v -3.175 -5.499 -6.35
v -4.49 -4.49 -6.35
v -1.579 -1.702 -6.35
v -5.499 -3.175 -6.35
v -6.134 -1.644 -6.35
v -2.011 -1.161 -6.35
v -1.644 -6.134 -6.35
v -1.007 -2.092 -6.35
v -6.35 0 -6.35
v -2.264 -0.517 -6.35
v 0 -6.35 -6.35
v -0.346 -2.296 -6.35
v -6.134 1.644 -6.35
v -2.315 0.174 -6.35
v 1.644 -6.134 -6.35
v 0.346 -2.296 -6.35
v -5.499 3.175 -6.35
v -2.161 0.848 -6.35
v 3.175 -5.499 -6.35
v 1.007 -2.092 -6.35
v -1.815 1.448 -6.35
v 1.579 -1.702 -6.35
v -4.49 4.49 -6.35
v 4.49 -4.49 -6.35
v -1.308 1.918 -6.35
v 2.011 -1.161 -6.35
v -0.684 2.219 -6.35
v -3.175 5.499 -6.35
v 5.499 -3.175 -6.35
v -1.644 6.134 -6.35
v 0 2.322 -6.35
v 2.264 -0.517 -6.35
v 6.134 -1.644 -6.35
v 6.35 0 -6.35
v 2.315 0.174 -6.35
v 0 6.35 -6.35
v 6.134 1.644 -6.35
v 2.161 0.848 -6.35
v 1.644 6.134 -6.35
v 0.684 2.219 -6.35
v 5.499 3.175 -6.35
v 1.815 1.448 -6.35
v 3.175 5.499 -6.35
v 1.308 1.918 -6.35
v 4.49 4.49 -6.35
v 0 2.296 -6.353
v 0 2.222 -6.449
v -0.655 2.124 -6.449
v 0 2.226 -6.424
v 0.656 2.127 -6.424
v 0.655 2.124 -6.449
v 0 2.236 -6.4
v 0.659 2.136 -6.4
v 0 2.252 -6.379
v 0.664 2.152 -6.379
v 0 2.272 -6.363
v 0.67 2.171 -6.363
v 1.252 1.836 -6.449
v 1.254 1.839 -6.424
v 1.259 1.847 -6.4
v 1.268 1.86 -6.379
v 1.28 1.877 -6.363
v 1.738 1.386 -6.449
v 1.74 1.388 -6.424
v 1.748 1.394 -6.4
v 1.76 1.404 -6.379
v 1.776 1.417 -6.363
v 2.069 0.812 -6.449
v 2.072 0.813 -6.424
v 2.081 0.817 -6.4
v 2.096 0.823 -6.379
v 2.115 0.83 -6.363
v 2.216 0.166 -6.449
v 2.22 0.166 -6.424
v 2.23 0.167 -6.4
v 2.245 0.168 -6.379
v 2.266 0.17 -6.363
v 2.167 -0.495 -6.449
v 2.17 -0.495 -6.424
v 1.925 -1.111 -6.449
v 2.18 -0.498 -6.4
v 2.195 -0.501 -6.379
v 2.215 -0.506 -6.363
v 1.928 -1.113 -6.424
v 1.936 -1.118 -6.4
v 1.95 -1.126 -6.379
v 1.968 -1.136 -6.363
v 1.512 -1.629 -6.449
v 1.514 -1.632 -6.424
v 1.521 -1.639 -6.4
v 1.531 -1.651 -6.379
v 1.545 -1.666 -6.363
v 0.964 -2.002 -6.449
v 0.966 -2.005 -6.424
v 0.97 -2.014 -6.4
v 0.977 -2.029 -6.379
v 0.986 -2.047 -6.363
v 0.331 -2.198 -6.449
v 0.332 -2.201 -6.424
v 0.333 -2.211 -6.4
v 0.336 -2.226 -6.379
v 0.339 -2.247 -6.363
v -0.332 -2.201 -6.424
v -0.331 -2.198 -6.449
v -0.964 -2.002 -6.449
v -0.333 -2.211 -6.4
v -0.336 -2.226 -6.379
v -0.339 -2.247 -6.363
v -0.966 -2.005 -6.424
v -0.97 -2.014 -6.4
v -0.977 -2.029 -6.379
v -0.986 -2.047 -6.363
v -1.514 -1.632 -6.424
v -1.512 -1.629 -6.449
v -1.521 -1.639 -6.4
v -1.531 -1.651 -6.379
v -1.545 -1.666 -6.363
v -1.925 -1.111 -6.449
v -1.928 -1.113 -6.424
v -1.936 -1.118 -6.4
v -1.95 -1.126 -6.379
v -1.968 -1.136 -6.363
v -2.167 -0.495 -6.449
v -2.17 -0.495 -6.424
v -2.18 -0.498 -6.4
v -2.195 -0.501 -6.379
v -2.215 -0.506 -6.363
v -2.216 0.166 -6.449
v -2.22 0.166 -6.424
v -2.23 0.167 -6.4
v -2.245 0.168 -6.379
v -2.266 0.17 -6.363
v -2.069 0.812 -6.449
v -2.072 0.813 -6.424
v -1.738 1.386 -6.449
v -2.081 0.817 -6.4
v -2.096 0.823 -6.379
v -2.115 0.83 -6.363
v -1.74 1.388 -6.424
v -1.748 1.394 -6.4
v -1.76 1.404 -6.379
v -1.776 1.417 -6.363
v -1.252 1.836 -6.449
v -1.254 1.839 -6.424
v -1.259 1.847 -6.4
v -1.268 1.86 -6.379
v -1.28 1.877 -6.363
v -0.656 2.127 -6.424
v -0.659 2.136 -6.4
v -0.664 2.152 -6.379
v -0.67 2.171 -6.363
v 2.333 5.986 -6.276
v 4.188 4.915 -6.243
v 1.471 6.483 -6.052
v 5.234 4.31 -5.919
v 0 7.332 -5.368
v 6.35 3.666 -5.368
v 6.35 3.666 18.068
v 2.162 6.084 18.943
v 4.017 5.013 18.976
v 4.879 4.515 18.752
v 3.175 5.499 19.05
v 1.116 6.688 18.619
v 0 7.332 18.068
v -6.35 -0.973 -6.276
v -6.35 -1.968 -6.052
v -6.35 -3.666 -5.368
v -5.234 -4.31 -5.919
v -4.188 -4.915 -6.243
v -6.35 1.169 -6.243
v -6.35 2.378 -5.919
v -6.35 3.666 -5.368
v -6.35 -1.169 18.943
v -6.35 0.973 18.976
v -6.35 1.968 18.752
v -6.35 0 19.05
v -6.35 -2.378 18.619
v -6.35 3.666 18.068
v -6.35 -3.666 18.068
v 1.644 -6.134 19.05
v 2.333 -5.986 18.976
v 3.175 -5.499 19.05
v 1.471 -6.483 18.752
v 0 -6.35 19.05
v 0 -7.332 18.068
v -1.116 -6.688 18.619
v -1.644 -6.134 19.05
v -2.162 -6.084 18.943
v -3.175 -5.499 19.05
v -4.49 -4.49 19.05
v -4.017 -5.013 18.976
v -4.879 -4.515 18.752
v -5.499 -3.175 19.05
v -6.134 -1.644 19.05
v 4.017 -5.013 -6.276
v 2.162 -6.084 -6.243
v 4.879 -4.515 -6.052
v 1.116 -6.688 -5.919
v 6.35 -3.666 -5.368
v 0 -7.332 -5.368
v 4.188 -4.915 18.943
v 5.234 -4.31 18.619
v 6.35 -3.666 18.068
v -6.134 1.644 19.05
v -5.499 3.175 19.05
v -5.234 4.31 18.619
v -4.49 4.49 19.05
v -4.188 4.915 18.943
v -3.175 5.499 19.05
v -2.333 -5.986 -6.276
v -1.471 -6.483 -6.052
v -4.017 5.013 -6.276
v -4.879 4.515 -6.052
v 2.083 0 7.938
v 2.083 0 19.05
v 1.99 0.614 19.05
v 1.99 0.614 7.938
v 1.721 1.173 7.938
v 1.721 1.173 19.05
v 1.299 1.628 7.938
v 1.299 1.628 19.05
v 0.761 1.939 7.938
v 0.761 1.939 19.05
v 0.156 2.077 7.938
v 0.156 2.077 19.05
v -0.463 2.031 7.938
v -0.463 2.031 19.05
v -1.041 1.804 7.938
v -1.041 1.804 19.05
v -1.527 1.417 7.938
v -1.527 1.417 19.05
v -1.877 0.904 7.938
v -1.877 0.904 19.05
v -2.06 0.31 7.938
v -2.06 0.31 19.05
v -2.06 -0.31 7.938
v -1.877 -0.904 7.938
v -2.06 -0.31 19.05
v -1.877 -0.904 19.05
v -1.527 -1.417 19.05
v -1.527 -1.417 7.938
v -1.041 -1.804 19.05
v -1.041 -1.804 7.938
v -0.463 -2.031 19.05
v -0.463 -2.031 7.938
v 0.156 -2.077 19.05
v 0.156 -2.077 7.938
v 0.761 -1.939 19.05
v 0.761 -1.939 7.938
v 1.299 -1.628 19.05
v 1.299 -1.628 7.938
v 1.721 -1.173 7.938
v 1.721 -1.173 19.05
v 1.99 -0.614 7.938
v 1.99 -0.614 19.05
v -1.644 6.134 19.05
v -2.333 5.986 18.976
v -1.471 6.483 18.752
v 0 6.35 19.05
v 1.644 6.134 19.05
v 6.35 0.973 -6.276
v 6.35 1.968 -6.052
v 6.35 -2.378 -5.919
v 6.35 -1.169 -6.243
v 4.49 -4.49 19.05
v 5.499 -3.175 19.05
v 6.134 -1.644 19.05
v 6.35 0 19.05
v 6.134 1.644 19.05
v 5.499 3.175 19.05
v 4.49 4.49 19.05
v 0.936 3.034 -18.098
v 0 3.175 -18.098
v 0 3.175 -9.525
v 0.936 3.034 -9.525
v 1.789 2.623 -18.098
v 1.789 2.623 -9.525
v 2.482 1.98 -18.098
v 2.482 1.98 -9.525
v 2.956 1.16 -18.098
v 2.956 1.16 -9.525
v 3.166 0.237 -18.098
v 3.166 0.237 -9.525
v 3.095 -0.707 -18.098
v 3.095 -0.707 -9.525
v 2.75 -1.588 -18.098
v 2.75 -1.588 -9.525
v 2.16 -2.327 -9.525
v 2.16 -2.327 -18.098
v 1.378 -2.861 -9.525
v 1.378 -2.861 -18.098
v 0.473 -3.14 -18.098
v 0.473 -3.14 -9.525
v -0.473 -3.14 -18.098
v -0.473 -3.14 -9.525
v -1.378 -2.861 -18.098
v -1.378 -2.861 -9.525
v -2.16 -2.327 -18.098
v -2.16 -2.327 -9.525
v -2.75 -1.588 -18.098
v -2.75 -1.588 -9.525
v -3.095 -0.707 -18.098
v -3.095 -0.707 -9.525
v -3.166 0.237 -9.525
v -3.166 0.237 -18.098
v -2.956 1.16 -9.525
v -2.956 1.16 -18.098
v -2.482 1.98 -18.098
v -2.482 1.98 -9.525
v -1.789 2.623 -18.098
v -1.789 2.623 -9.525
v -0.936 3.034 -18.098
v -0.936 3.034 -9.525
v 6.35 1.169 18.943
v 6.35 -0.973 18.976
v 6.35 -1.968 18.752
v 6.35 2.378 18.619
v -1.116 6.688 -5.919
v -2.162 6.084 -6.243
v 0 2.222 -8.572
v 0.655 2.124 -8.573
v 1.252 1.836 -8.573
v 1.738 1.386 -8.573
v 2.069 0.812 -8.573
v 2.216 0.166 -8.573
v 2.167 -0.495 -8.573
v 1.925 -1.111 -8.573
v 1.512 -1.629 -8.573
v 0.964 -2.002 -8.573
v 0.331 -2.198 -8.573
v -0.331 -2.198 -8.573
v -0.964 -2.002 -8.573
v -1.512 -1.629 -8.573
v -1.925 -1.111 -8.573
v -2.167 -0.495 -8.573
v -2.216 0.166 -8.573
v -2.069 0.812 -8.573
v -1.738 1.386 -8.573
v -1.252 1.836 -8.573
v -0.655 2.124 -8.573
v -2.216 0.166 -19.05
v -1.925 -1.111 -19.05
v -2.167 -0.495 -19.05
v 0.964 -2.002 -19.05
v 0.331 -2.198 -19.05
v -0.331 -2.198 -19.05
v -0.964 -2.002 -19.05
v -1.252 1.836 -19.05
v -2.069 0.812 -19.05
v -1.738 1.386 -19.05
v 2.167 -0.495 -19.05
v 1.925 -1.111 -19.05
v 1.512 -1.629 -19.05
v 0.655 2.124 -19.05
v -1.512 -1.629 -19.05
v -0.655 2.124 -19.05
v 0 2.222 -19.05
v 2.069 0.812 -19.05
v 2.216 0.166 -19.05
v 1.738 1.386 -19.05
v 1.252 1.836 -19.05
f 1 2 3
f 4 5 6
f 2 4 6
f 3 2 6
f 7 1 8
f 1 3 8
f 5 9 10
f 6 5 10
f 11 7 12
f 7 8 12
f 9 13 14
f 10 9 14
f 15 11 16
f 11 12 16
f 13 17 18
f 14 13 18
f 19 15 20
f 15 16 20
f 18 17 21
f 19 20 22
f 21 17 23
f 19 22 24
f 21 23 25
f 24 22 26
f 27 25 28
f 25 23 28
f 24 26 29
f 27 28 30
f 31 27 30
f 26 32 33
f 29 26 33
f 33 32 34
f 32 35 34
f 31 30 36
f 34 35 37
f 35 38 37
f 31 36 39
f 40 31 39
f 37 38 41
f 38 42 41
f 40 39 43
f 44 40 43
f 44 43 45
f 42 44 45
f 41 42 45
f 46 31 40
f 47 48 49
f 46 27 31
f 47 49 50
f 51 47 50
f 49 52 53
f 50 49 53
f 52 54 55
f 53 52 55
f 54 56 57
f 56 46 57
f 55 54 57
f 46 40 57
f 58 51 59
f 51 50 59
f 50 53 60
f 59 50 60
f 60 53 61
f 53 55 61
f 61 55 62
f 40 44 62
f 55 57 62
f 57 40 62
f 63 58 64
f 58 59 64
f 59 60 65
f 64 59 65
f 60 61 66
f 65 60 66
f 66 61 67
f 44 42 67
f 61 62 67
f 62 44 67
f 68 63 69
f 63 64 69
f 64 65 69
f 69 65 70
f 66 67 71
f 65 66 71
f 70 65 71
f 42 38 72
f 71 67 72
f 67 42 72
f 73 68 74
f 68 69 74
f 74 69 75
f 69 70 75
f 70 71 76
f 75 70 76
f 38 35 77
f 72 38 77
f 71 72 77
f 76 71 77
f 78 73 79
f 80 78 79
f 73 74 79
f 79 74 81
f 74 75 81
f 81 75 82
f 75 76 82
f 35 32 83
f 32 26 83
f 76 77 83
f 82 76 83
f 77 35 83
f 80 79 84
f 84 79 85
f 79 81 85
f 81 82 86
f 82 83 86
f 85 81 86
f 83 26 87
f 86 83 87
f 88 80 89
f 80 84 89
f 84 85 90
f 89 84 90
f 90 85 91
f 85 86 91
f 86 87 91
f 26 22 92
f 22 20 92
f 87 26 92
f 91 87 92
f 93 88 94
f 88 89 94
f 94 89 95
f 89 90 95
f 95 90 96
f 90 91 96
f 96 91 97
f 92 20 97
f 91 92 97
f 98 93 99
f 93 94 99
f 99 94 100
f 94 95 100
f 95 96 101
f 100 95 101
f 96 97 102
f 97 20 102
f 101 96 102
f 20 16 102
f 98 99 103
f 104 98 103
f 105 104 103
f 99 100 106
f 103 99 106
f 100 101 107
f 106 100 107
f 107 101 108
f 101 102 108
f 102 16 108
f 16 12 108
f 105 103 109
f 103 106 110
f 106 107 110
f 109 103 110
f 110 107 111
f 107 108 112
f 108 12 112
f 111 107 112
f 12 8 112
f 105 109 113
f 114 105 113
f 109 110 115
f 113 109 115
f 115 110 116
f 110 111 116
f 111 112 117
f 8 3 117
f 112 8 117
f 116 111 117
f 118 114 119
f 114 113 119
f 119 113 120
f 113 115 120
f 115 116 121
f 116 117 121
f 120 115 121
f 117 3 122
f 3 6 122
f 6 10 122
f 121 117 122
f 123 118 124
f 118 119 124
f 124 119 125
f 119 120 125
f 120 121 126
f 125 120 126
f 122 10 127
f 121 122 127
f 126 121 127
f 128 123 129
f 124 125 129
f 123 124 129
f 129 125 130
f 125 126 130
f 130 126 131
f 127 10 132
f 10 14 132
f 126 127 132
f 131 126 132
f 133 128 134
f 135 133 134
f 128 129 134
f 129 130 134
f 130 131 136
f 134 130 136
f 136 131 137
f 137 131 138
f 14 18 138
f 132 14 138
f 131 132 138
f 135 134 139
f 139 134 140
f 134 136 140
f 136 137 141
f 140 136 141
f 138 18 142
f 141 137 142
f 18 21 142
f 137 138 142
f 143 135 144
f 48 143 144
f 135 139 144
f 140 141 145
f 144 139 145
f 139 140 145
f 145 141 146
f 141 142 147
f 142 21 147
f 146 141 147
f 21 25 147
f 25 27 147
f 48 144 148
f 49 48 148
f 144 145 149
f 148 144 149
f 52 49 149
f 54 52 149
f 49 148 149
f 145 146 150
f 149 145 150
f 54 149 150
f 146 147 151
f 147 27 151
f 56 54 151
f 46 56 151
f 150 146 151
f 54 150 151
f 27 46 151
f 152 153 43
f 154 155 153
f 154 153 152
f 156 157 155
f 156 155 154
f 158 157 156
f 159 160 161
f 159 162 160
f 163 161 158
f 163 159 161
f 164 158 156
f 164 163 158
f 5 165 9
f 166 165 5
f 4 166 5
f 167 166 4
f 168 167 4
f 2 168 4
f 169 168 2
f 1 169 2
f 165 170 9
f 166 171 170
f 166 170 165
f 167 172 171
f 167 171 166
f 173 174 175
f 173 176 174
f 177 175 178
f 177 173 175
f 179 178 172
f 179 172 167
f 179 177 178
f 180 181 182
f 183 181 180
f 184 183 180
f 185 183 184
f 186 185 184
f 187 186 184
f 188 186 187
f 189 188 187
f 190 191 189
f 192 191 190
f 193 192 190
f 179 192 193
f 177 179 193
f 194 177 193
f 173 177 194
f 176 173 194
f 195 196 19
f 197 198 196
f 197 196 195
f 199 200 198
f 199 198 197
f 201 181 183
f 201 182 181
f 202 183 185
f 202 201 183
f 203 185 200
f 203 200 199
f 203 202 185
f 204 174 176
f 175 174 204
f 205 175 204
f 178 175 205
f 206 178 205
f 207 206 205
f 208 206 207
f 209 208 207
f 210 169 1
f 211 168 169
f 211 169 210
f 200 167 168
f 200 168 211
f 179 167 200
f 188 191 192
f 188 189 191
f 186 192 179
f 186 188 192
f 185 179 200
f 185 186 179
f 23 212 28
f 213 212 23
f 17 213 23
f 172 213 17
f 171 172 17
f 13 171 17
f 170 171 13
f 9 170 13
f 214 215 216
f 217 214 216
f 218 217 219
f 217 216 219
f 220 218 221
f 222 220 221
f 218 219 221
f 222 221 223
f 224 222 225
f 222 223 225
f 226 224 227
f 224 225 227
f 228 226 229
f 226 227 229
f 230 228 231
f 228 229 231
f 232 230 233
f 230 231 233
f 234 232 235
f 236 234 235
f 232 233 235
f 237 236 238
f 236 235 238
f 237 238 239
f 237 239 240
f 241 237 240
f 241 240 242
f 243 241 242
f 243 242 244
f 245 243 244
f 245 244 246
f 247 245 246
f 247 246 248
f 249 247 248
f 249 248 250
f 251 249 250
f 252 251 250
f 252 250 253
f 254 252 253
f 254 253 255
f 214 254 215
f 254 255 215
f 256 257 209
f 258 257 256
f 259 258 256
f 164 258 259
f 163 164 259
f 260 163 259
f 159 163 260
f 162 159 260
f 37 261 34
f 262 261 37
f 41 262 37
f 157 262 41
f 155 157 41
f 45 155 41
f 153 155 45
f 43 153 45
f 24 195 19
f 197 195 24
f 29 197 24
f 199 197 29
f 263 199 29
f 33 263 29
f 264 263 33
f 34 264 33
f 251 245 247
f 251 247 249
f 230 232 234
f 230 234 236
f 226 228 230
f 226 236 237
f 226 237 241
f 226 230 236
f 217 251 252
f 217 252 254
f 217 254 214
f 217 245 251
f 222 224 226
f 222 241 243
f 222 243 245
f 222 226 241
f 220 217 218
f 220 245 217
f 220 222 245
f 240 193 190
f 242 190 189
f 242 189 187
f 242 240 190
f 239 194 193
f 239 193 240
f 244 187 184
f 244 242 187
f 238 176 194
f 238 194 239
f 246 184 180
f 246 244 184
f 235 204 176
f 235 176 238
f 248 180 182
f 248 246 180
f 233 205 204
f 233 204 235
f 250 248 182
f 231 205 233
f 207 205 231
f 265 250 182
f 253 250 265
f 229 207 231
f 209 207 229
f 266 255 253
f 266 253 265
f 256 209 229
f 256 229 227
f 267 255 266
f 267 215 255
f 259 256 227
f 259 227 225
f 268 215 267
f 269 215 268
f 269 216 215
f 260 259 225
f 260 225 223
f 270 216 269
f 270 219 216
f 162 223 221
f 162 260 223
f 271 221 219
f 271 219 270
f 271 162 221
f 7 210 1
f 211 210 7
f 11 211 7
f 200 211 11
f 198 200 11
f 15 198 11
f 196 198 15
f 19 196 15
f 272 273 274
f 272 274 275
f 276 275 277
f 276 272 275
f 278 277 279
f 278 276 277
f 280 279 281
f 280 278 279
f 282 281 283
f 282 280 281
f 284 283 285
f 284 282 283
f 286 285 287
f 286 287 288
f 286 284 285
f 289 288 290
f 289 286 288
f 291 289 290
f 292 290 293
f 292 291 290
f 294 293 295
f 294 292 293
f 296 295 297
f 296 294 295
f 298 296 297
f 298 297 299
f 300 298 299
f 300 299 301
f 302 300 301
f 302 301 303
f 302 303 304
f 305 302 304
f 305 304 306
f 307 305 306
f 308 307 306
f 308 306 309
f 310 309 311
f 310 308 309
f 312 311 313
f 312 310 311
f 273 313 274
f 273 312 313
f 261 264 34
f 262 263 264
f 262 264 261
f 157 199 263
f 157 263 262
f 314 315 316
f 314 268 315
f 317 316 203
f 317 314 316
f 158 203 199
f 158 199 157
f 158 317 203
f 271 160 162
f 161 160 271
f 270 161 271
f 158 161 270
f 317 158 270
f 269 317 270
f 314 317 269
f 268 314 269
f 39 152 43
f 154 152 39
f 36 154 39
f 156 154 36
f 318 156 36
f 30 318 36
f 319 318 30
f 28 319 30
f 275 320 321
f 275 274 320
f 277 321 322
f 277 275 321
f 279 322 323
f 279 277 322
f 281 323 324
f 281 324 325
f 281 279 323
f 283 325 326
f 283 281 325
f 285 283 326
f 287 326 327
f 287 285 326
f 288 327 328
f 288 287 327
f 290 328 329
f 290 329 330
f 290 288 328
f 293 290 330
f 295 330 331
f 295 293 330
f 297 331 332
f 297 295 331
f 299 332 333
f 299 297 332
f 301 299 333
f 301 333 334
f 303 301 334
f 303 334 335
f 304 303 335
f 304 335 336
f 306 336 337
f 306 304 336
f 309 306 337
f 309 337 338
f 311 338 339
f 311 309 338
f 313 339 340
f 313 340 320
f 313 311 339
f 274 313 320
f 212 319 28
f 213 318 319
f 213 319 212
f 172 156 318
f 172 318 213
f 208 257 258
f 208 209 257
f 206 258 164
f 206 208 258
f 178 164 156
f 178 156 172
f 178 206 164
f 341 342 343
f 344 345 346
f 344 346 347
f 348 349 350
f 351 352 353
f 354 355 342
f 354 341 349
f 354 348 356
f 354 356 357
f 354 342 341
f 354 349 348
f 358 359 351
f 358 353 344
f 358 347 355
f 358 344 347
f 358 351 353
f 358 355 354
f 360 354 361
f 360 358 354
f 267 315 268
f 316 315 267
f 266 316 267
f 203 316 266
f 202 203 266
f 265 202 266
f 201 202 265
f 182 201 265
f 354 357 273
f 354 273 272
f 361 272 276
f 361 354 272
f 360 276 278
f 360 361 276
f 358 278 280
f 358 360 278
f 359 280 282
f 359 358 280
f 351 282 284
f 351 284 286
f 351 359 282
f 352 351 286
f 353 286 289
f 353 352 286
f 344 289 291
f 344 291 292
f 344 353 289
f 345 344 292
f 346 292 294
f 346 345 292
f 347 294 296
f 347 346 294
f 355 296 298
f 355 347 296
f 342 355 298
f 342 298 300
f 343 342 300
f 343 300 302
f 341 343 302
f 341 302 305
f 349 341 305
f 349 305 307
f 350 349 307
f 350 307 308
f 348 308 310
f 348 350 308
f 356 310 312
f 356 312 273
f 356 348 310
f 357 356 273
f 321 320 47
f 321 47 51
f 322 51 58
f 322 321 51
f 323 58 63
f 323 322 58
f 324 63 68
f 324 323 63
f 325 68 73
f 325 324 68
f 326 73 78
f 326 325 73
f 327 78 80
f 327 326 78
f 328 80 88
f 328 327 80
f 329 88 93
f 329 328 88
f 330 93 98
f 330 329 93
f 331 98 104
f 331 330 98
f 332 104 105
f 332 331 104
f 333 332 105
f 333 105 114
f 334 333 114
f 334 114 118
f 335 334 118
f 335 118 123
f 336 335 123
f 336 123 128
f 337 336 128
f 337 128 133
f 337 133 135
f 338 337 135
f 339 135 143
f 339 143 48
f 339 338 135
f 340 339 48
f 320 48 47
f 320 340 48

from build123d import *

# Parameters (mm, degrees)
BOSS_EXTRUDE1_START = 19.05
BOSS_EXTRUDE1_DEPTH = 25.4
CHAMFER1_SIZE       = 0.9525
SKETCH4_R           = 2.0828
CUT_EXTRUDE1_DEPTH  = 11.1125
FILLET1_R           = 0.09921875
SKETCH5_OUTSIDE_W   = 101.45
SKETCH5_OUTSIDE_H   = 103.414
SKETCH5_OUTSIDE_R   = 6.35
CUT_EXTRUDE2_DEPTH  = 39.1
CUT_EXTRUDE2_TAPER  = 45
SKETCH6_OUTSIDE_W   = 76.05
SKETCH6_OUTSIDE_H   = 78.014
SKETCH6_OUTSIDE_R   = 6.35
CUT_EXTRUDE3_DEPTH  = 26.4
CUT_EXTRUDE3_TAPER  = 45


with BuildPart() as part:
    # Sketch2 → Boss-Extrude1 (new body)
    with BuildSketch(Plane.XY.offset(BOSS_EXTRUDE1_START)):
        Polygon((6.35, 3.666174209), (0, 7.332348419), (-6.35, 3.666174209), (-6.35, -3.666174209), (0, -7.332348419), (6.35, -3.666174209), align=None)
    extrude(amount=-BOSS_EXTRUDE1_DEPTH)

    # Sketch3 → Revolve1 (revolve)
    with BuildSketch(Plane(origin=(0, 0, 0), x_dir=(0, 0, -1), z_dir=(1, 0, 0))):
        Polygon((6.35, 2.2225), (8.5725, 2.2225), (9.525, 3.175), (19.05, 3.175), (19.05, 0), (6.35, 0), align=None)
    revolve(axis=Axis((0, 0, 19.05), (0, 0, -1)))

    # Chamfer1
    chamfer1_edges = [part.edges().sort_by_distance(p)[0] for p in [
        (0, -3.175, -19.05),
    ]]
    chamfer(chamfer1_edges, length=CHAMFER1_SIZE)

    # Sketch4 → Cut-Extrude1 (cut)
    with BuildSketch(Plane.XY.offset(19.05)):
        Circle(SKETCH4_R)
    extrude(amount=-CUT_EXTRUDE1_DEPTH, mode=Mode.SUBTRACT)

    # Fillet1
    fillet1_edges = [part.edges().sort_by_distance(p)[0] for p in [
        (0, -2.2225, -6.35),
    ]]
    fillet(fillet1_edges, radius=FILLET1_R)

    # Sketch5 outside → Cut-Extrude2 (cut, through all)
    with BuildSketch(Plane.XY.offset(19.05)):
        Rectangle(SKETCH5_OUTSIDE_W, SKETCH5_OUTSIDE_H)
        Circle(SKETCH5_OUTSIDE_R, mode=Mode.SUBTRACT)
    extrude(amount=-CUT_EXTRUDE2_DEPTH, taper=CUT_EXTRUDE2_TAPER, mode=Mode.SUBTRACT)

    # Sketch6 outside → Cut-Extrude3 (cut, through all)
    with BuildSketch(Plane(origin=(0, 0, -6.35), x_dir=(-1, 0, 0), z_dir=(0, 0, -1))):
        Rectangle(SKETCH6_OUTSIDE_W, SKETCH6_OUTSIDE_H)
        Circle(SKETCH6_OUTSIDE_R, mode=Mode.SUBTRACT)
    extrude(amount=-CUT_EXTRUDE3_DEPTH, taper=CUT_EXTRUDE3_TAPER, mode=Mode.SUBTRACT)


solid = part.part
